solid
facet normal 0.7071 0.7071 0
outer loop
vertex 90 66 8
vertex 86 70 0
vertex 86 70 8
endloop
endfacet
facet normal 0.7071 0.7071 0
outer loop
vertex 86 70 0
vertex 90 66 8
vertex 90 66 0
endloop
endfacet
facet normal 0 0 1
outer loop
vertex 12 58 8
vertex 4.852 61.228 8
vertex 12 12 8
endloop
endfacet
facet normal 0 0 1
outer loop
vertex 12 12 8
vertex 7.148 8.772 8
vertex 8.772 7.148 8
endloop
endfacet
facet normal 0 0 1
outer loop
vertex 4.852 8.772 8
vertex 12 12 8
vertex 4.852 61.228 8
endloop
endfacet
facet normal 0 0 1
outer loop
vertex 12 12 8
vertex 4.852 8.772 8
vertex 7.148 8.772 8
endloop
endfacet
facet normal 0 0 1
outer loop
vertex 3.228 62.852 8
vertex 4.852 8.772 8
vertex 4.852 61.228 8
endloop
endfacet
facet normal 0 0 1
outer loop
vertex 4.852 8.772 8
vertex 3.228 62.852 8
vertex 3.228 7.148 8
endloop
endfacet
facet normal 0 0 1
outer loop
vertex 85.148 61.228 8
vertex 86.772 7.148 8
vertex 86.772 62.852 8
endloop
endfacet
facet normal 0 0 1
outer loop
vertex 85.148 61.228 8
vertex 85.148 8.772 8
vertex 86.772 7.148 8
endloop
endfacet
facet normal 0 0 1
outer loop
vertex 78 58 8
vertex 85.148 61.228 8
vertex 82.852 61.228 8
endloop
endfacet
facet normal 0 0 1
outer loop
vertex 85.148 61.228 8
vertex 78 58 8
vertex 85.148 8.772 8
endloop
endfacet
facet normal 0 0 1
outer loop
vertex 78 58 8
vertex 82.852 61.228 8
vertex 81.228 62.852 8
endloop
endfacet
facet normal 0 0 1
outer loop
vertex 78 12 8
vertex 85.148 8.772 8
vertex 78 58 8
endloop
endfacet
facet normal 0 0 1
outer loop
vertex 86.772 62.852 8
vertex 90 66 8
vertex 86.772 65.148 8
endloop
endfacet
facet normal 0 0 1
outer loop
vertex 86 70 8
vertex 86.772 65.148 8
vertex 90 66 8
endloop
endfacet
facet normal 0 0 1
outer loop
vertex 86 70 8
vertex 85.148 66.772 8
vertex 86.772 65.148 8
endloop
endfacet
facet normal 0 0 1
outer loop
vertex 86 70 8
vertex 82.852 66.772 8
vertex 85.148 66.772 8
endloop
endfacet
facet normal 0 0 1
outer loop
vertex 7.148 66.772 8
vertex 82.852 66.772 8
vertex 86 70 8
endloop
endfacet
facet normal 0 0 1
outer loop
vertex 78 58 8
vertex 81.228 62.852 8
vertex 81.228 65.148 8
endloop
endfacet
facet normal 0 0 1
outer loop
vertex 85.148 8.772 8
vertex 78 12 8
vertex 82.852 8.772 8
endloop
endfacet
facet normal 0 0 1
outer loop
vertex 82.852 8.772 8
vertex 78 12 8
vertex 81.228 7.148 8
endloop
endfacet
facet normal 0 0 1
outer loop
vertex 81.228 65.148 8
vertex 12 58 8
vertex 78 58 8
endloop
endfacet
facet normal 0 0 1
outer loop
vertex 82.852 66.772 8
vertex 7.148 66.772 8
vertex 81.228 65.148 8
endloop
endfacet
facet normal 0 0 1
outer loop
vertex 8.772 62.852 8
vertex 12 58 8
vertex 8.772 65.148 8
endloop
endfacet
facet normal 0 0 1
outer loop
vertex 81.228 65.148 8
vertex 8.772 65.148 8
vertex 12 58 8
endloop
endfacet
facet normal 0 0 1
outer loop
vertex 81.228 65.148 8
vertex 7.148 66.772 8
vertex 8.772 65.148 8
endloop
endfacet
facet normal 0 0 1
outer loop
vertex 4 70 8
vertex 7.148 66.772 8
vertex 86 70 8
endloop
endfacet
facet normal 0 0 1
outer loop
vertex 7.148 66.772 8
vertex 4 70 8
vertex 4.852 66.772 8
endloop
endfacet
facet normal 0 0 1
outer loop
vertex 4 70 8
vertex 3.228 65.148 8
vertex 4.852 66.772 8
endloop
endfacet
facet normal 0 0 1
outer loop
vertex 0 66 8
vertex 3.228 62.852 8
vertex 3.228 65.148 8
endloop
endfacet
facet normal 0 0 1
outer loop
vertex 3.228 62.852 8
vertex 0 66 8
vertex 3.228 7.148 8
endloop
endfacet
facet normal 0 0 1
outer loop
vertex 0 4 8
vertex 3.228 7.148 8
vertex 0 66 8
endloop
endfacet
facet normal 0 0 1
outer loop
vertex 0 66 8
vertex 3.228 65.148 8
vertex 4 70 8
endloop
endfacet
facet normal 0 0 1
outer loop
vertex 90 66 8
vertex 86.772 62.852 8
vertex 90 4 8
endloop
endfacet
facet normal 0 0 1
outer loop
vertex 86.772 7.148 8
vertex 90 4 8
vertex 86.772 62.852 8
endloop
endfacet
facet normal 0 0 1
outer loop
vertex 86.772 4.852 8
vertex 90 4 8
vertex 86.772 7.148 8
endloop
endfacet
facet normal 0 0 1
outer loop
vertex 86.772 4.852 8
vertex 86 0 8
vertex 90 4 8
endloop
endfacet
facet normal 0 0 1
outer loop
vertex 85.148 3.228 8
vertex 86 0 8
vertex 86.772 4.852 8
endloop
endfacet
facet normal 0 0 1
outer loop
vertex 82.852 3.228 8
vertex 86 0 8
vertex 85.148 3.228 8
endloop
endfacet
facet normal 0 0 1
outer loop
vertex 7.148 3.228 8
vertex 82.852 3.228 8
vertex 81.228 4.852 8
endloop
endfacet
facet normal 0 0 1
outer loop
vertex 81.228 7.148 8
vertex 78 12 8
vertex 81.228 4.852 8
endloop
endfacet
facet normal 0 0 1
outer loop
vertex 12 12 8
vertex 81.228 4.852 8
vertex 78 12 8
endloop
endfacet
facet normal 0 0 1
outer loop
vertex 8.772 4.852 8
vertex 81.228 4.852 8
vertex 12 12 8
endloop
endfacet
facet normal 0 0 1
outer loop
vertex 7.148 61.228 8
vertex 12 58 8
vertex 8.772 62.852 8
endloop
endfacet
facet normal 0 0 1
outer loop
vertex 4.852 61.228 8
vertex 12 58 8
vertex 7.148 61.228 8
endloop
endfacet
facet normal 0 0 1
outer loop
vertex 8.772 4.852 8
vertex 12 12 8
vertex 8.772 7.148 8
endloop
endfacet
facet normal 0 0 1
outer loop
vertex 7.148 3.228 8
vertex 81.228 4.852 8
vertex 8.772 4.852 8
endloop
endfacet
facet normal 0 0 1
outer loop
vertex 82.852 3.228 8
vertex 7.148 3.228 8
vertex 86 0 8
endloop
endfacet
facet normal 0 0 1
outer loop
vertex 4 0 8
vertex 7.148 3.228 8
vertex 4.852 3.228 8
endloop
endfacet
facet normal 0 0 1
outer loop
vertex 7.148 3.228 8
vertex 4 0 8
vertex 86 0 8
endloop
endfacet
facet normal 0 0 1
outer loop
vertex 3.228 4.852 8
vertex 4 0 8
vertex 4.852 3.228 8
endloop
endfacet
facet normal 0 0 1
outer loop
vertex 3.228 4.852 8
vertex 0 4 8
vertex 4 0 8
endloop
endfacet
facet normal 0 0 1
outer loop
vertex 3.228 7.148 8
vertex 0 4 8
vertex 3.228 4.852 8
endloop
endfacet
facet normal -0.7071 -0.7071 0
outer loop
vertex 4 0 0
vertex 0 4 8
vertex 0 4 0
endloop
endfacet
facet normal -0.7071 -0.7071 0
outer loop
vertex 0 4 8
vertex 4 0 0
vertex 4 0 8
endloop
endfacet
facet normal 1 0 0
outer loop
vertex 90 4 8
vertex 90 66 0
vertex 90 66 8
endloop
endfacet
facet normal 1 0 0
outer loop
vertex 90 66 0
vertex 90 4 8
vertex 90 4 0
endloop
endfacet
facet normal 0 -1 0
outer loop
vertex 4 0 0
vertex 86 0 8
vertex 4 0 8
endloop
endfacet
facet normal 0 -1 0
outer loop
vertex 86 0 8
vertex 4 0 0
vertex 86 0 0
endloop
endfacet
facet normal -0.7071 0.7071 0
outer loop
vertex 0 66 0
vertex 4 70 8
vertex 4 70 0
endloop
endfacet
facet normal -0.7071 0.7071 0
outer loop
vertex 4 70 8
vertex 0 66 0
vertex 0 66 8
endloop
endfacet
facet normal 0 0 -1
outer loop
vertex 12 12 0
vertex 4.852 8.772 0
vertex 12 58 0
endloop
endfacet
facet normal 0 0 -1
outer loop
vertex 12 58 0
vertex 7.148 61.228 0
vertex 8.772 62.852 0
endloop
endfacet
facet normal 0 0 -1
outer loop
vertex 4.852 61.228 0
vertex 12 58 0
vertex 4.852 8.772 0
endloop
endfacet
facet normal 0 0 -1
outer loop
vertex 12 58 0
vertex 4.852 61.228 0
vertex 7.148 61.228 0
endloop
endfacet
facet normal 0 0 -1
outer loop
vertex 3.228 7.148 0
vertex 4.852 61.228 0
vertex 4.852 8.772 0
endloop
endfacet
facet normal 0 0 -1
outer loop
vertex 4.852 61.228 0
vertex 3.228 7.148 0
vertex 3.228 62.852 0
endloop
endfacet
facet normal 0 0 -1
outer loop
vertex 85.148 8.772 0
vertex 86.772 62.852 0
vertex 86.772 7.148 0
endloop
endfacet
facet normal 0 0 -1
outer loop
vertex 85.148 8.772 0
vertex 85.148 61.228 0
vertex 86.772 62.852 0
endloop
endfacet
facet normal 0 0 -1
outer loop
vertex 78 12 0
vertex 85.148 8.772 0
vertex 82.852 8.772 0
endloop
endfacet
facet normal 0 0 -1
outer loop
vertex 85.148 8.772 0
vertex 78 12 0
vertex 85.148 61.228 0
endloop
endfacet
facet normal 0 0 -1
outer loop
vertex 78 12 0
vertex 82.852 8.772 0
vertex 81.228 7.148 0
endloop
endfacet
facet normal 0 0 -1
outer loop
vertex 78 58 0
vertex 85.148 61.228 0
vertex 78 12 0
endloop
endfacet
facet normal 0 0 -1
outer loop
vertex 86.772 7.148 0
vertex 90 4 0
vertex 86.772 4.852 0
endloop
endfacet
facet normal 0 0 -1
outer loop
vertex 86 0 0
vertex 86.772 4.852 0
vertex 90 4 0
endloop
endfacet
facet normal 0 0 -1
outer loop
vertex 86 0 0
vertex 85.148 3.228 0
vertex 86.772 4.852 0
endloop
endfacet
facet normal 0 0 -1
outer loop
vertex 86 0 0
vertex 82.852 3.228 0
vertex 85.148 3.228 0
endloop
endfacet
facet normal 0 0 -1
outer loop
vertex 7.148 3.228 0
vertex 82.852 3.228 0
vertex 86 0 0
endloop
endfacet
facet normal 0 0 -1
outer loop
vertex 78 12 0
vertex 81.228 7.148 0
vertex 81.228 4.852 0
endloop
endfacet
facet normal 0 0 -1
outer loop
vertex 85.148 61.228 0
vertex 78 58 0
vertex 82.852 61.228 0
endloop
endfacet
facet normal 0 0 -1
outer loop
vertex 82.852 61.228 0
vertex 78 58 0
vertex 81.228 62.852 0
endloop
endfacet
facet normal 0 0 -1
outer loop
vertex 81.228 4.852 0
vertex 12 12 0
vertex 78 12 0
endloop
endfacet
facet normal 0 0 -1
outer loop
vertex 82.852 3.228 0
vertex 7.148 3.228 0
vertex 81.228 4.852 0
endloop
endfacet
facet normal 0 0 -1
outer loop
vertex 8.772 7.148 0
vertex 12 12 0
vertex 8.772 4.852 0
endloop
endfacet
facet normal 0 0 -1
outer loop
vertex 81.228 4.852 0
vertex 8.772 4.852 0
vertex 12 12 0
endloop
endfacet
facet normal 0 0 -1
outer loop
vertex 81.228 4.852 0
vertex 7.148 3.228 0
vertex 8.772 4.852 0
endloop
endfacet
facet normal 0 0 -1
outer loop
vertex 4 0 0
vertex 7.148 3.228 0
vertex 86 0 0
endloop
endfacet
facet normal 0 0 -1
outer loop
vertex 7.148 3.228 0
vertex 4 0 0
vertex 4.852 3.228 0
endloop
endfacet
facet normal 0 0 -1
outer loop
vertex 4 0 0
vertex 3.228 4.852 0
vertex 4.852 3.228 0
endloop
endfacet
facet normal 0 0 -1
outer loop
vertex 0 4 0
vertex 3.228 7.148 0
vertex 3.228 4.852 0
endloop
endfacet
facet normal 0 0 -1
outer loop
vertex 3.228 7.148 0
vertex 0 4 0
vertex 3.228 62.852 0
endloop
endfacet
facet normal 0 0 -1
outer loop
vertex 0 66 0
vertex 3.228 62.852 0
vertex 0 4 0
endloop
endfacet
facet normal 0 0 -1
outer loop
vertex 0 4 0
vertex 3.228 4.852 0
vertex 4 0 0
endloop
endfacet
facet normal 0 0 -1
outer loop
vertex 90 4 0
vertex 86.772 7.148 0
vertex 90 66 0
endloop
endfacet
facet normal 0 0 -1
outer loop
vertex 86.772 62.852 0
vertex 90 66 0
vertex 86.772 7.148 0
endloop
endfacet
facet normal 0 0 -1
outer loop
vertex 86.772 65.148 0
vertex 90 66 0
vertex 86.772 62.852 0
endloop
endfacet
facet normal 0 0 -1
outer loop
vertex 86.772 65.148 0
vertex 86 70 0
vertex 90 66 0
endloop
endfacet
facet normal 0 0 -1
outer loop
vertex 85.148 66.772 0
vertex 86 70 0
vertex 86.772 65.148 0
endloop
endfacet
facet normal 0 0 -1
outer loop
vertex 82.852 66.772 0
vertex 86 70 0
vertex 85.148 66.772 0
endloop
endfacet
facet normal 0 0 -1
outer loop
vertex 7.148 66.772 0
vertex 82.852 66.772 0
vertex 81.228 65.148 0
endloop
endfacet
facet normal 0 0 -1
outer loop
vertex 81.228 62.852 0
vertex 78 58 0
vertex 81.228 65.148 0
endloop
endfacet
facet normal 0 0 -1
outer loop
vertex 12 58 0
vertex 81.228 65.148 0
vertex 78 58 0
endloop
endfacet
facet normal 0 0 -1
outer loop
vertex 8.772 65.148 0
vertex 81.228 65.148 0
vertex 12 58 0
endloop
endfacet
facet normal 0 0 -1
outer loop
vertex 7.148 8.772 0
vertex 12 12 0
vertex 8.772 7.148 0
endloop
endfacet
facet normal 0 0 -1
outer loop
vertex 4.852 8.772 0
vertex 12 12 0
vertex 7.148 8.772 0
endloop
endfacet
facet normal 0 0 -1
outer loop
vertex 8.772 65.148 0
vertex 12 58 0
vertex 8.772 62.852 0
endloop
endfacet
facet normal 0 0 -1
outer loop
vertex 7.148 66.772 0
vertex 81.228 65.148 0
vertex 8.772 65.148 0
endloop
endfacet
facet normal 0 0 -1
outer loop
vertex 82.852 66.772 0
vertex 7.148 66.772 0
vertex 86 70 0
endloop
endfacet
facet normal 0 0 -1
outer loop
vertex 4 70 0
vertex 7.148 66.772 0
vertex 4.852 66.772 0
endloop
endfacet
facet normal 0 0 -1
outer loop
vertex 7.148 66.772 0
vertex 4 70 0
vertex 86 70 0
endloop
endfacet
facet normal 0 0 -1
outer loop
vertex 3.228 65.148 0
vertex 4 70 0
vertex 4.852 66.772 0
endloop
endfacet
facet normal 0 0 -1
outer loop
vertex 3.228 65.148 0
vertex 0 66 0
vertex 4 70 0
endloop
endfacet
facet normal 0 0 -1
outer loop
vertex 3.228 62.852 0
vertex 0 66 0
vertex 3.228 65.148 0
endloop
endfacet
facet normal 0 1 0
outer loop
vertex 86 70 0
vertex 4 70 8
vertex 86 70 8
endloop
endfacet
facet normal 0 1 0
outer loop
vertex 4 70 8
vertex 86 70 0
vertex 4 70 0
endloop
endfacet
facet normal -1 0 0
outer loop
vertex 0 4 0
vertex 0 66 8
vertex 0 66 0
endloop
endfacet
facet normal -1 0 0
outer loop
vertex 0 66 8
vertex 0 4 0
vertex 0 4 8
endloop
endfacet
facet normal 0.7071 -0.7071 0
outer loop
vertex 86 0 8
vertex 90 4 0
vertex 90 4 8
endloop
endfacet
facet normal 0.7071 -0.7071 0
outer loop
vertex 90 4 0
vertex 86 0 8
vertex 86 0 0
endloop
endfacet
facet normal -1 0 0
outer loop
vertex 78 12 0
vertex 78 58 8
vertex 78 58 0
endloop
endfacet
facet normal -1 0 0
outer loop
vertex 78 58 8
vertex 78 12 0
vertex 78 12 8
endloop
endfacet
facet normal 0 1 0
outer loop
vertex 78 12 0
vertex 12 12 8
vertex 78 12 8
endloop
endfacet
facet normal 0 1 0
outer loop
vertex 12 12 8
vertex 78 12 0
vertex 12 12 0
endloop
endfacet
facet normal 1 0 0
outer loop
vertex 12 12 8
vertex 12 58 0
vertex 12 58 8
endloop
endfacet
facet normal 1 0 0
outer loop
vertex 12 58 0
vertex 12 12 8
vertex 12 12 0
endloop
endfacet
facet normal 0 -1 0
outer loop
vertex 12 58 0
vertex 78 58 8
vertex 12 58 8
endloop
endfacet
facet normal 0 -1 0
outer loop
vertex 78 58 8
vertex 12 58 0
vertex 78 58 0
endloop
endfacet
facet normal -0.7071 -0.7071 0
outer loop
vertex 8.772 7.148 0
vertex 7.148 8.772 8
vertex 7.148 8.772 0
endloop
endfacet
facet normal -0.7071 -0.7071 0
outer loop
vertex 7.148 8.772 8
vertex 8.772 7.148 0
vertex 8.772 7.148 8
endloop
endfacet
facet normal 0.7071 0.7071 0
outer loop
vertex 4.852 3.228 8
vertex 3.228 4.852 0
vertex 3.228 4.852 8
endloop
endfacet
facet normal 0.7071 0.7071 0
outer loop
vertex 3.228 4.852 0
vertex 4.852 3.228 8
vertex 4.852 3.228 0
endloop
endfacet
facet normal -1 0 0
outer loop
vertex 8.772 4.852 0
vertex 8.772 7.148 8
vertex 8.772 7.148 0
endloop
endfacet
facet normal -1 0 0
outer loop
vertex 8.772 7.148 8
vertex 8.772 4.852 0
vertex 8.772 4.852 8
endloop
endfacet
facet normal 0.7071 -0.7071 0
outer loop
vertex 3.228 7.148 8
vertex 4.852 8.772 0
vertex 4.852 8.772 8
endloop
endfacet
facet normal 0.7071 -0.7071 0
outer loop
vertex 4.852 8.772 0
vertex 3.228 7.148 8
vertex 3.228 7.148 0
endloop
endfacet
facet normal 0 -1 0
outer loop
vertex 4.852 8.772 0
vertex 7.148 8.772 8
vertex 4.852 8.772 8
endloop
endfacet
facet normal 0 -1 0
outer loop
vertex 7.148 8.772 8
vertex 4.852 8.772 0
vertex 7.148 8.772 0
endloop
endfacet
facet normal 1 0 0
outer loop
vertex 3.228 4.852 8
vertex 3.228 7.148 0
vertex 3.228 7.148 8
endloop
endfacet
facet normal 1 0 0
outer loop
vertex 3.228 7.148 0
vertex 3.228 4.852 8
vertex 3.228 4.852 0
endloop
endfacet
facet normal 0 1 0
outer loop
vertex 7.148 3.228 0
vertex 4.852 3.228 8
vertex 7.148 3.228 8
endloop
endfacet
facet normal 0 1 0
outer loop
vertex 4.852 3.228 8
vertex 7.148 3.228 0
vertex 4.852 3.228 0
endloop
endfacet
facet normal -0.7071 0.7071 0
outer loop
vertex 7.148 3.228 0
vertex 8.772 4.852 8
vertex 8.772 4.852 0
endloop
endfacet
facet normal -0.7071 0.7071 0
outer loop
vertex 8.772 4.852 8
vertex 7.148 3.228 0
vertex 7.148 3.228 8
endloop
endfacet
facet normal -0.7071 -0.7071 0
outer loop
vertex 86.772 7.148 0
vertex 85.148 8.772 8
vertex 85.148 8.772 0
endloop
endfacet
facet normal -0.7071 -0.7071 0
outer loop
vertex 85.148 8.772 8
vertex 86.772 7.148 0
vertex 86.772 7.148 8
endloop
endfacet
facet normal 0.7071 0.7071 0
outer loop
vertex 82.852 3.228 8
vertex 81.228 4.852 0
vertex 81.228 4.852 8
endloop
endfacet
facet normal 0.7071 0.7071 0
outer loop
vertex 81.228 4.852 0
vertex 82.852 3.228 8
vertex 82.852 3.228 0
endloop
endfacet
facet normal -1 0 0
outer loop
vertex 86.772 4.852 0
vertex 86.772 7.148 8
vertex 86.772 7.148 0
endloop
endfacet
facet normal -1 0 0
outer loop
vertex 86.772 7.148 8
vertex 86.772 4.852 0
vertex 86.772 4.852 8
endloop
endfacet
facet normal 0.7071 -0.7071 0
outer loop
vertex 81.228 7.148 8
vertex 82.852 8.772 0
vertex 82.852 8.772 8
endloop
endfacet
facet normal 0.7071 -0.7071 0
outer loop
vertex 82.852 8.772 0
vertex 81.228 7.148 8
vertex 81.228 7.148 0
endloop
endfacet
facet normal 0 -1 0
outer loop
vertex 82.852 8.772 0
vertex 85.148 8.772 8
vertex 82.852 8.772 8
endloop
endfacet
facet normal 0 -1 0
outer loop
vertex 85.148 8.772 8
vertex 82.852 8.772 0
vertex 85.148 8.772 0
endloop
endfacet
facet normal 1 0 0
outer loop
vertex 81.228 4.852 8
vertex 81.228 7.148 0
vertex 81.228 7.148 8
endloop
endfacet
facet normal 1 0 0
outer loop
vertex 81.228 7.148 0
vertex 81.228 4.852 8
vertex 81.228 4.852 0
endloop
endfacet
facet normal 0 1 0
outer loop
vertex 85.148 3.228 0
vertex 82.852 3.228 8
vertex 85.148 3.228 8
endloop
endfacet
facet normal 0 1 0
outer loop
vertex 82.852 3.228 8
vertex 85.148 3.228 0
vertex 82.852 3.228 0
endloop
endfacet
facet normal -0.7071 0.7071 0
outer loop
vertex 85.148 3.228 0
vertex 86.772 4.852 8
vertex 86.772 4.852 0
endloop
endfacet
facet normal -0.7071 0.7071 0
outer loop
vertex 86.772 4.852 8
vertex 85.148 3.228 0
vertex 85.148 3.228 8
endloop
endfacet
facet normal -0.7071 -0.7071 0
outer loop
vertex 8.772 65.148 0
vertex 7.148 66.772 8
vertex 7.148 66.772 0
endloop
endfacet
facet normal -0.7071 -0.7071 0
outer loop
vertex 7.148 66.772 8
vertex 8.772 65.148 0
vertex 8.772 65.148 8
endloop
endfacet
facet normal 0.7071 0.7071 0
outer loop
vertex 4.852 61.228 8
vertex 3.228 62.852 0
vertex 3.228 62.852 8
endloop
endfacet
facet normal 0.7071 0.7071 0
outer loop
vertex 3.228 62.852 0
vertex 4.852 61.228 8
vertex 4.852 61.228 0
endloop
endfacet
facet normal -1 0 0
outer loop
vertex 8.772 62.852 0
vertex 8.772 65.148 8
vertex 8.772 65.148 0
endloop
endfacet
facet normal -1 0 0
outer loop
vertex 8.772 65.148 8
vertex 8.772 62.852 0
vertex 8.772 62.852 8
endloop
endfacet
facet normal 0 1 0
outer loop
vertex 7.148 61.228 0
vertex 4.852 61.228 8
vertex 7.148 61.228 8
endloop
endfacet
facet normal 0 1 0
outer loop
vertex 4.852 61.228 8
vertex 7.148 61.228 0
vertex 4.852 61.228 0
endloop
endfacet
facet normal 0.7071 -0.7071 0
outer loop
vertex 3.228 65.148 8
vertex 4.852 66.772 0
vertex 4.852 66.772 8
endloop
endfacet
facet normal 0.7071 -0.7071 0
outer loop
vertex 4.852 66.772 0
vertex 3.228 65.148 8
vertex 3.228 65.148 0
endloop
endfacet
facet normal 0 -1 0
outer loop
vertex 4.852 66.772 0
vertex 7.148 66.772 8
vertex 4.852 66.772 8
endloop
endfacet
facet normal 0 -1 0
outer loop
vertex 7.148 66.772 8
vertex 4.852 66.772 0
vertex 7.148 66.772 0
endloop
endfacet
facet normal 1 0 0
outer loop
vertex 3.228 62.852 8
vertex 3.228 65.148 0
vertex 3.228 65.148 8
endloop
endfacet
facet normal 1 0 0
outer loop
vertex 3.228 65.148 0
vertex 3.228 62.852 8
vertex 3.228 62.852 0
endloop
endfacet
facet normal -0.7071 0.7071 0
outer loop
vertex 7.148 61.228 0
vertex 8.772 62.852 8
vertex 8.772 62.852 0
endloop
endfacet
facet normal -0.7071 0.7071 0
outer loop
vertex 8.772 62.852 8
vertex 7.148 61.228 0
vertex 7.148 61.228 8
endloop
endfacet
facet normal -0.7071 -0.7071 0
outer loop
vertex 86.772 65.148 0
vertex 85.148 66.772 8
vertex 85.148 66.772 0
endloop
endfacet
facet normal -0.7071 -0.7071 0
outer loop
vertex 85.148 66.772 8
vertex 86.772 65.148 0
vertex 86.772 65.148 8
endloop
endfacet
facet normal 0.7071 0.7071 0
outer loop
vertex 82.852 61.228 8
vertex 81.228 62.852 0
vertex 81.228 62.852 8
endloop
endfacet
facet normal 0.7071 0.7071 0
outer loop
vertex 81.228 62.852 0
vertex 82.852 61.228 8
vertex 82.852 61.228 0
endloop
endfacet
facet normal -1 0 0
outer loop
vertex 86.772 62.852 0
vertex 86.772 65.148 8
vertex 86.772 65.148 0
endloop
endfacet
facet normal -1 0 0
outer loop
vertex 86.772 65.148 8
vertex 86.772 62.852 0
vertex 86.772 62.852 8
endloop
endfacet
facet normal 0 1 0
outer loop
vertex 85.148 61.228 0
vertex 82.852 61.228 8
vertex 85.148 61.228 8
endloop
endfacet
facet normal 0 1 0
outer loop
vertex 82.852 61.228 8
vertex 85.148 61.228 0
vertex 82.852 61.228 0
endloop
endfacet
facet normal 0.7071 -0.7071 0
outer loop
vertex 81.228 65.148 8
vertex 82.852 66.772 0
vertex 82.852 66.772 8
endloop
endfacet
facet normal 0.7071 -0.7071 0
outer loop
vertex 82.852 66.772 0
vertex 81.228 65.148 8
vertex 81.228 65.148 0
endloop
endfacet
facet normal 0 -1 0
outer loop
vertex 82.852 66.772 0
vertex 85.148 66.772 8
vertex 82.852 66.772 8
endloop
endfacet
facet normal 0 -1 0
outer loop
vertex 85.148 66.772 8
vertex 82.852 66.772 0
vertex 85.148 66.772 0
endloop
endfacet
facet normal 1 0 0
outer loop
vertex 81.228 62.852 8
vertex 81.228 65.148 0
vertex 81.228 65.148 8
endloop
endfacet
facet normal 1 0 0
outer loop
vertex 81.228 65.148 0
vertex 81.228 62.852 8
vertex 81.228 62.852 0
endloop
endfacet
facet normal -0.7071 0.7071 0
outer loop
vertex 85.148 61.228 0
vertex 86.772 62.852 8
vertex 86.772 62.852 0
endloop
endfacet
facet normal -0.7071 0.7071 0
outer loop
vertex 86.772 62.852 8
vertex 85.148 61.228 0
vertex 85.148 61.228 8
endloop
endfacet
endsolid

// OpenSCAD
$fn = 32;

// ----------------------------------------------------------------------
// Frame plate: 90 x 70 frame, 12 mm rails
// ----------------------------------------------------------------------

// --- parameters (mm) ---
plate_l = 90;             // plate length, X
plate_w = 70;             // plate width, Y
plate_t = 8;              // plate thickness, Z (extrusion height)
corner_c = 4;             // corner chamfer
frame_bar = 12;           // frame rail width
bolt_r = 3;               // corner bolt window radius
bolt_inset = 6;           // bolt centre inset from the edges

win_l = plate_l - 2 * frame_bar;  // window length
win_w = plate_w - 2 * frame_bar;  // window width
bolt_d = 2 * bolt_r;  // corner hole diameter

profile = [[4, 0], [86, 0], [90, 4], [90, 66], [86, 70], [4, 70], [0, 66], [0, 4]];  // primary outline, 8 points, counter clockwise
void_1 = [[12, 12], [78, 12], [78, 58], [12, 58]];  // the window, 4 points
void_2 = [[8.772, 7.148], [7.148, 8.772], [4.852, 8.772], [3.228, 7.148], [3.228, 4.852], [4.852, 3.228], [7.148, 3.228], [8.772, 4.852]];  // corner bolt window, 8 points
void_3 = [[86.772, 7.148], [85.148, 8.772], [82.852, 8.772], [81.228, 7.148], [81.228, 4.852], [82.852, 3.228], [85.148, 3.228], [86.772, 4.852]];  // corner bolt window, 8 points
void_4 = [[8.772, 65.148], [7.148, 66.772], [4.852, 66.772], [3.228, 65.148], [3.228, 62.852], [4.852, 61.228], [7.148, 61.228], [8.772, 62.852]];  // corner bolt window, 8 points
void_5 = [[86.772, 65.148], [85.148, 66.772], [82.852, 66.772], [81.228, 65.148], [81.228, 62.852], [82.852, 61.228], [85.148, 61.228], [86.772, 62.852]];  // corner bolt window, 8 points

// --- the one profile operation ---
difference() {
  linear_extrude(height = plate_t) polygon(points = profile);
  translate([0, 0, -1])
    linear_extrude(height = plate_t + 2) polygon(points = void_1);
  translate([0, 0, -1])
    linear_extrude(height = plate_t + 2) polygon(points = void_2);
  translate([0, 0, -1])
    linear_extrude(height = plate_t + 2) polygon(points = void_3);
  translate([0, 0, -1])
    linear_extrude(height = plate_t + 2) polygon(points = void_4);
  translate([0, 0, -1])
    linear_extrude(height = plate_t + 2) polygon(points = void_5);
}
